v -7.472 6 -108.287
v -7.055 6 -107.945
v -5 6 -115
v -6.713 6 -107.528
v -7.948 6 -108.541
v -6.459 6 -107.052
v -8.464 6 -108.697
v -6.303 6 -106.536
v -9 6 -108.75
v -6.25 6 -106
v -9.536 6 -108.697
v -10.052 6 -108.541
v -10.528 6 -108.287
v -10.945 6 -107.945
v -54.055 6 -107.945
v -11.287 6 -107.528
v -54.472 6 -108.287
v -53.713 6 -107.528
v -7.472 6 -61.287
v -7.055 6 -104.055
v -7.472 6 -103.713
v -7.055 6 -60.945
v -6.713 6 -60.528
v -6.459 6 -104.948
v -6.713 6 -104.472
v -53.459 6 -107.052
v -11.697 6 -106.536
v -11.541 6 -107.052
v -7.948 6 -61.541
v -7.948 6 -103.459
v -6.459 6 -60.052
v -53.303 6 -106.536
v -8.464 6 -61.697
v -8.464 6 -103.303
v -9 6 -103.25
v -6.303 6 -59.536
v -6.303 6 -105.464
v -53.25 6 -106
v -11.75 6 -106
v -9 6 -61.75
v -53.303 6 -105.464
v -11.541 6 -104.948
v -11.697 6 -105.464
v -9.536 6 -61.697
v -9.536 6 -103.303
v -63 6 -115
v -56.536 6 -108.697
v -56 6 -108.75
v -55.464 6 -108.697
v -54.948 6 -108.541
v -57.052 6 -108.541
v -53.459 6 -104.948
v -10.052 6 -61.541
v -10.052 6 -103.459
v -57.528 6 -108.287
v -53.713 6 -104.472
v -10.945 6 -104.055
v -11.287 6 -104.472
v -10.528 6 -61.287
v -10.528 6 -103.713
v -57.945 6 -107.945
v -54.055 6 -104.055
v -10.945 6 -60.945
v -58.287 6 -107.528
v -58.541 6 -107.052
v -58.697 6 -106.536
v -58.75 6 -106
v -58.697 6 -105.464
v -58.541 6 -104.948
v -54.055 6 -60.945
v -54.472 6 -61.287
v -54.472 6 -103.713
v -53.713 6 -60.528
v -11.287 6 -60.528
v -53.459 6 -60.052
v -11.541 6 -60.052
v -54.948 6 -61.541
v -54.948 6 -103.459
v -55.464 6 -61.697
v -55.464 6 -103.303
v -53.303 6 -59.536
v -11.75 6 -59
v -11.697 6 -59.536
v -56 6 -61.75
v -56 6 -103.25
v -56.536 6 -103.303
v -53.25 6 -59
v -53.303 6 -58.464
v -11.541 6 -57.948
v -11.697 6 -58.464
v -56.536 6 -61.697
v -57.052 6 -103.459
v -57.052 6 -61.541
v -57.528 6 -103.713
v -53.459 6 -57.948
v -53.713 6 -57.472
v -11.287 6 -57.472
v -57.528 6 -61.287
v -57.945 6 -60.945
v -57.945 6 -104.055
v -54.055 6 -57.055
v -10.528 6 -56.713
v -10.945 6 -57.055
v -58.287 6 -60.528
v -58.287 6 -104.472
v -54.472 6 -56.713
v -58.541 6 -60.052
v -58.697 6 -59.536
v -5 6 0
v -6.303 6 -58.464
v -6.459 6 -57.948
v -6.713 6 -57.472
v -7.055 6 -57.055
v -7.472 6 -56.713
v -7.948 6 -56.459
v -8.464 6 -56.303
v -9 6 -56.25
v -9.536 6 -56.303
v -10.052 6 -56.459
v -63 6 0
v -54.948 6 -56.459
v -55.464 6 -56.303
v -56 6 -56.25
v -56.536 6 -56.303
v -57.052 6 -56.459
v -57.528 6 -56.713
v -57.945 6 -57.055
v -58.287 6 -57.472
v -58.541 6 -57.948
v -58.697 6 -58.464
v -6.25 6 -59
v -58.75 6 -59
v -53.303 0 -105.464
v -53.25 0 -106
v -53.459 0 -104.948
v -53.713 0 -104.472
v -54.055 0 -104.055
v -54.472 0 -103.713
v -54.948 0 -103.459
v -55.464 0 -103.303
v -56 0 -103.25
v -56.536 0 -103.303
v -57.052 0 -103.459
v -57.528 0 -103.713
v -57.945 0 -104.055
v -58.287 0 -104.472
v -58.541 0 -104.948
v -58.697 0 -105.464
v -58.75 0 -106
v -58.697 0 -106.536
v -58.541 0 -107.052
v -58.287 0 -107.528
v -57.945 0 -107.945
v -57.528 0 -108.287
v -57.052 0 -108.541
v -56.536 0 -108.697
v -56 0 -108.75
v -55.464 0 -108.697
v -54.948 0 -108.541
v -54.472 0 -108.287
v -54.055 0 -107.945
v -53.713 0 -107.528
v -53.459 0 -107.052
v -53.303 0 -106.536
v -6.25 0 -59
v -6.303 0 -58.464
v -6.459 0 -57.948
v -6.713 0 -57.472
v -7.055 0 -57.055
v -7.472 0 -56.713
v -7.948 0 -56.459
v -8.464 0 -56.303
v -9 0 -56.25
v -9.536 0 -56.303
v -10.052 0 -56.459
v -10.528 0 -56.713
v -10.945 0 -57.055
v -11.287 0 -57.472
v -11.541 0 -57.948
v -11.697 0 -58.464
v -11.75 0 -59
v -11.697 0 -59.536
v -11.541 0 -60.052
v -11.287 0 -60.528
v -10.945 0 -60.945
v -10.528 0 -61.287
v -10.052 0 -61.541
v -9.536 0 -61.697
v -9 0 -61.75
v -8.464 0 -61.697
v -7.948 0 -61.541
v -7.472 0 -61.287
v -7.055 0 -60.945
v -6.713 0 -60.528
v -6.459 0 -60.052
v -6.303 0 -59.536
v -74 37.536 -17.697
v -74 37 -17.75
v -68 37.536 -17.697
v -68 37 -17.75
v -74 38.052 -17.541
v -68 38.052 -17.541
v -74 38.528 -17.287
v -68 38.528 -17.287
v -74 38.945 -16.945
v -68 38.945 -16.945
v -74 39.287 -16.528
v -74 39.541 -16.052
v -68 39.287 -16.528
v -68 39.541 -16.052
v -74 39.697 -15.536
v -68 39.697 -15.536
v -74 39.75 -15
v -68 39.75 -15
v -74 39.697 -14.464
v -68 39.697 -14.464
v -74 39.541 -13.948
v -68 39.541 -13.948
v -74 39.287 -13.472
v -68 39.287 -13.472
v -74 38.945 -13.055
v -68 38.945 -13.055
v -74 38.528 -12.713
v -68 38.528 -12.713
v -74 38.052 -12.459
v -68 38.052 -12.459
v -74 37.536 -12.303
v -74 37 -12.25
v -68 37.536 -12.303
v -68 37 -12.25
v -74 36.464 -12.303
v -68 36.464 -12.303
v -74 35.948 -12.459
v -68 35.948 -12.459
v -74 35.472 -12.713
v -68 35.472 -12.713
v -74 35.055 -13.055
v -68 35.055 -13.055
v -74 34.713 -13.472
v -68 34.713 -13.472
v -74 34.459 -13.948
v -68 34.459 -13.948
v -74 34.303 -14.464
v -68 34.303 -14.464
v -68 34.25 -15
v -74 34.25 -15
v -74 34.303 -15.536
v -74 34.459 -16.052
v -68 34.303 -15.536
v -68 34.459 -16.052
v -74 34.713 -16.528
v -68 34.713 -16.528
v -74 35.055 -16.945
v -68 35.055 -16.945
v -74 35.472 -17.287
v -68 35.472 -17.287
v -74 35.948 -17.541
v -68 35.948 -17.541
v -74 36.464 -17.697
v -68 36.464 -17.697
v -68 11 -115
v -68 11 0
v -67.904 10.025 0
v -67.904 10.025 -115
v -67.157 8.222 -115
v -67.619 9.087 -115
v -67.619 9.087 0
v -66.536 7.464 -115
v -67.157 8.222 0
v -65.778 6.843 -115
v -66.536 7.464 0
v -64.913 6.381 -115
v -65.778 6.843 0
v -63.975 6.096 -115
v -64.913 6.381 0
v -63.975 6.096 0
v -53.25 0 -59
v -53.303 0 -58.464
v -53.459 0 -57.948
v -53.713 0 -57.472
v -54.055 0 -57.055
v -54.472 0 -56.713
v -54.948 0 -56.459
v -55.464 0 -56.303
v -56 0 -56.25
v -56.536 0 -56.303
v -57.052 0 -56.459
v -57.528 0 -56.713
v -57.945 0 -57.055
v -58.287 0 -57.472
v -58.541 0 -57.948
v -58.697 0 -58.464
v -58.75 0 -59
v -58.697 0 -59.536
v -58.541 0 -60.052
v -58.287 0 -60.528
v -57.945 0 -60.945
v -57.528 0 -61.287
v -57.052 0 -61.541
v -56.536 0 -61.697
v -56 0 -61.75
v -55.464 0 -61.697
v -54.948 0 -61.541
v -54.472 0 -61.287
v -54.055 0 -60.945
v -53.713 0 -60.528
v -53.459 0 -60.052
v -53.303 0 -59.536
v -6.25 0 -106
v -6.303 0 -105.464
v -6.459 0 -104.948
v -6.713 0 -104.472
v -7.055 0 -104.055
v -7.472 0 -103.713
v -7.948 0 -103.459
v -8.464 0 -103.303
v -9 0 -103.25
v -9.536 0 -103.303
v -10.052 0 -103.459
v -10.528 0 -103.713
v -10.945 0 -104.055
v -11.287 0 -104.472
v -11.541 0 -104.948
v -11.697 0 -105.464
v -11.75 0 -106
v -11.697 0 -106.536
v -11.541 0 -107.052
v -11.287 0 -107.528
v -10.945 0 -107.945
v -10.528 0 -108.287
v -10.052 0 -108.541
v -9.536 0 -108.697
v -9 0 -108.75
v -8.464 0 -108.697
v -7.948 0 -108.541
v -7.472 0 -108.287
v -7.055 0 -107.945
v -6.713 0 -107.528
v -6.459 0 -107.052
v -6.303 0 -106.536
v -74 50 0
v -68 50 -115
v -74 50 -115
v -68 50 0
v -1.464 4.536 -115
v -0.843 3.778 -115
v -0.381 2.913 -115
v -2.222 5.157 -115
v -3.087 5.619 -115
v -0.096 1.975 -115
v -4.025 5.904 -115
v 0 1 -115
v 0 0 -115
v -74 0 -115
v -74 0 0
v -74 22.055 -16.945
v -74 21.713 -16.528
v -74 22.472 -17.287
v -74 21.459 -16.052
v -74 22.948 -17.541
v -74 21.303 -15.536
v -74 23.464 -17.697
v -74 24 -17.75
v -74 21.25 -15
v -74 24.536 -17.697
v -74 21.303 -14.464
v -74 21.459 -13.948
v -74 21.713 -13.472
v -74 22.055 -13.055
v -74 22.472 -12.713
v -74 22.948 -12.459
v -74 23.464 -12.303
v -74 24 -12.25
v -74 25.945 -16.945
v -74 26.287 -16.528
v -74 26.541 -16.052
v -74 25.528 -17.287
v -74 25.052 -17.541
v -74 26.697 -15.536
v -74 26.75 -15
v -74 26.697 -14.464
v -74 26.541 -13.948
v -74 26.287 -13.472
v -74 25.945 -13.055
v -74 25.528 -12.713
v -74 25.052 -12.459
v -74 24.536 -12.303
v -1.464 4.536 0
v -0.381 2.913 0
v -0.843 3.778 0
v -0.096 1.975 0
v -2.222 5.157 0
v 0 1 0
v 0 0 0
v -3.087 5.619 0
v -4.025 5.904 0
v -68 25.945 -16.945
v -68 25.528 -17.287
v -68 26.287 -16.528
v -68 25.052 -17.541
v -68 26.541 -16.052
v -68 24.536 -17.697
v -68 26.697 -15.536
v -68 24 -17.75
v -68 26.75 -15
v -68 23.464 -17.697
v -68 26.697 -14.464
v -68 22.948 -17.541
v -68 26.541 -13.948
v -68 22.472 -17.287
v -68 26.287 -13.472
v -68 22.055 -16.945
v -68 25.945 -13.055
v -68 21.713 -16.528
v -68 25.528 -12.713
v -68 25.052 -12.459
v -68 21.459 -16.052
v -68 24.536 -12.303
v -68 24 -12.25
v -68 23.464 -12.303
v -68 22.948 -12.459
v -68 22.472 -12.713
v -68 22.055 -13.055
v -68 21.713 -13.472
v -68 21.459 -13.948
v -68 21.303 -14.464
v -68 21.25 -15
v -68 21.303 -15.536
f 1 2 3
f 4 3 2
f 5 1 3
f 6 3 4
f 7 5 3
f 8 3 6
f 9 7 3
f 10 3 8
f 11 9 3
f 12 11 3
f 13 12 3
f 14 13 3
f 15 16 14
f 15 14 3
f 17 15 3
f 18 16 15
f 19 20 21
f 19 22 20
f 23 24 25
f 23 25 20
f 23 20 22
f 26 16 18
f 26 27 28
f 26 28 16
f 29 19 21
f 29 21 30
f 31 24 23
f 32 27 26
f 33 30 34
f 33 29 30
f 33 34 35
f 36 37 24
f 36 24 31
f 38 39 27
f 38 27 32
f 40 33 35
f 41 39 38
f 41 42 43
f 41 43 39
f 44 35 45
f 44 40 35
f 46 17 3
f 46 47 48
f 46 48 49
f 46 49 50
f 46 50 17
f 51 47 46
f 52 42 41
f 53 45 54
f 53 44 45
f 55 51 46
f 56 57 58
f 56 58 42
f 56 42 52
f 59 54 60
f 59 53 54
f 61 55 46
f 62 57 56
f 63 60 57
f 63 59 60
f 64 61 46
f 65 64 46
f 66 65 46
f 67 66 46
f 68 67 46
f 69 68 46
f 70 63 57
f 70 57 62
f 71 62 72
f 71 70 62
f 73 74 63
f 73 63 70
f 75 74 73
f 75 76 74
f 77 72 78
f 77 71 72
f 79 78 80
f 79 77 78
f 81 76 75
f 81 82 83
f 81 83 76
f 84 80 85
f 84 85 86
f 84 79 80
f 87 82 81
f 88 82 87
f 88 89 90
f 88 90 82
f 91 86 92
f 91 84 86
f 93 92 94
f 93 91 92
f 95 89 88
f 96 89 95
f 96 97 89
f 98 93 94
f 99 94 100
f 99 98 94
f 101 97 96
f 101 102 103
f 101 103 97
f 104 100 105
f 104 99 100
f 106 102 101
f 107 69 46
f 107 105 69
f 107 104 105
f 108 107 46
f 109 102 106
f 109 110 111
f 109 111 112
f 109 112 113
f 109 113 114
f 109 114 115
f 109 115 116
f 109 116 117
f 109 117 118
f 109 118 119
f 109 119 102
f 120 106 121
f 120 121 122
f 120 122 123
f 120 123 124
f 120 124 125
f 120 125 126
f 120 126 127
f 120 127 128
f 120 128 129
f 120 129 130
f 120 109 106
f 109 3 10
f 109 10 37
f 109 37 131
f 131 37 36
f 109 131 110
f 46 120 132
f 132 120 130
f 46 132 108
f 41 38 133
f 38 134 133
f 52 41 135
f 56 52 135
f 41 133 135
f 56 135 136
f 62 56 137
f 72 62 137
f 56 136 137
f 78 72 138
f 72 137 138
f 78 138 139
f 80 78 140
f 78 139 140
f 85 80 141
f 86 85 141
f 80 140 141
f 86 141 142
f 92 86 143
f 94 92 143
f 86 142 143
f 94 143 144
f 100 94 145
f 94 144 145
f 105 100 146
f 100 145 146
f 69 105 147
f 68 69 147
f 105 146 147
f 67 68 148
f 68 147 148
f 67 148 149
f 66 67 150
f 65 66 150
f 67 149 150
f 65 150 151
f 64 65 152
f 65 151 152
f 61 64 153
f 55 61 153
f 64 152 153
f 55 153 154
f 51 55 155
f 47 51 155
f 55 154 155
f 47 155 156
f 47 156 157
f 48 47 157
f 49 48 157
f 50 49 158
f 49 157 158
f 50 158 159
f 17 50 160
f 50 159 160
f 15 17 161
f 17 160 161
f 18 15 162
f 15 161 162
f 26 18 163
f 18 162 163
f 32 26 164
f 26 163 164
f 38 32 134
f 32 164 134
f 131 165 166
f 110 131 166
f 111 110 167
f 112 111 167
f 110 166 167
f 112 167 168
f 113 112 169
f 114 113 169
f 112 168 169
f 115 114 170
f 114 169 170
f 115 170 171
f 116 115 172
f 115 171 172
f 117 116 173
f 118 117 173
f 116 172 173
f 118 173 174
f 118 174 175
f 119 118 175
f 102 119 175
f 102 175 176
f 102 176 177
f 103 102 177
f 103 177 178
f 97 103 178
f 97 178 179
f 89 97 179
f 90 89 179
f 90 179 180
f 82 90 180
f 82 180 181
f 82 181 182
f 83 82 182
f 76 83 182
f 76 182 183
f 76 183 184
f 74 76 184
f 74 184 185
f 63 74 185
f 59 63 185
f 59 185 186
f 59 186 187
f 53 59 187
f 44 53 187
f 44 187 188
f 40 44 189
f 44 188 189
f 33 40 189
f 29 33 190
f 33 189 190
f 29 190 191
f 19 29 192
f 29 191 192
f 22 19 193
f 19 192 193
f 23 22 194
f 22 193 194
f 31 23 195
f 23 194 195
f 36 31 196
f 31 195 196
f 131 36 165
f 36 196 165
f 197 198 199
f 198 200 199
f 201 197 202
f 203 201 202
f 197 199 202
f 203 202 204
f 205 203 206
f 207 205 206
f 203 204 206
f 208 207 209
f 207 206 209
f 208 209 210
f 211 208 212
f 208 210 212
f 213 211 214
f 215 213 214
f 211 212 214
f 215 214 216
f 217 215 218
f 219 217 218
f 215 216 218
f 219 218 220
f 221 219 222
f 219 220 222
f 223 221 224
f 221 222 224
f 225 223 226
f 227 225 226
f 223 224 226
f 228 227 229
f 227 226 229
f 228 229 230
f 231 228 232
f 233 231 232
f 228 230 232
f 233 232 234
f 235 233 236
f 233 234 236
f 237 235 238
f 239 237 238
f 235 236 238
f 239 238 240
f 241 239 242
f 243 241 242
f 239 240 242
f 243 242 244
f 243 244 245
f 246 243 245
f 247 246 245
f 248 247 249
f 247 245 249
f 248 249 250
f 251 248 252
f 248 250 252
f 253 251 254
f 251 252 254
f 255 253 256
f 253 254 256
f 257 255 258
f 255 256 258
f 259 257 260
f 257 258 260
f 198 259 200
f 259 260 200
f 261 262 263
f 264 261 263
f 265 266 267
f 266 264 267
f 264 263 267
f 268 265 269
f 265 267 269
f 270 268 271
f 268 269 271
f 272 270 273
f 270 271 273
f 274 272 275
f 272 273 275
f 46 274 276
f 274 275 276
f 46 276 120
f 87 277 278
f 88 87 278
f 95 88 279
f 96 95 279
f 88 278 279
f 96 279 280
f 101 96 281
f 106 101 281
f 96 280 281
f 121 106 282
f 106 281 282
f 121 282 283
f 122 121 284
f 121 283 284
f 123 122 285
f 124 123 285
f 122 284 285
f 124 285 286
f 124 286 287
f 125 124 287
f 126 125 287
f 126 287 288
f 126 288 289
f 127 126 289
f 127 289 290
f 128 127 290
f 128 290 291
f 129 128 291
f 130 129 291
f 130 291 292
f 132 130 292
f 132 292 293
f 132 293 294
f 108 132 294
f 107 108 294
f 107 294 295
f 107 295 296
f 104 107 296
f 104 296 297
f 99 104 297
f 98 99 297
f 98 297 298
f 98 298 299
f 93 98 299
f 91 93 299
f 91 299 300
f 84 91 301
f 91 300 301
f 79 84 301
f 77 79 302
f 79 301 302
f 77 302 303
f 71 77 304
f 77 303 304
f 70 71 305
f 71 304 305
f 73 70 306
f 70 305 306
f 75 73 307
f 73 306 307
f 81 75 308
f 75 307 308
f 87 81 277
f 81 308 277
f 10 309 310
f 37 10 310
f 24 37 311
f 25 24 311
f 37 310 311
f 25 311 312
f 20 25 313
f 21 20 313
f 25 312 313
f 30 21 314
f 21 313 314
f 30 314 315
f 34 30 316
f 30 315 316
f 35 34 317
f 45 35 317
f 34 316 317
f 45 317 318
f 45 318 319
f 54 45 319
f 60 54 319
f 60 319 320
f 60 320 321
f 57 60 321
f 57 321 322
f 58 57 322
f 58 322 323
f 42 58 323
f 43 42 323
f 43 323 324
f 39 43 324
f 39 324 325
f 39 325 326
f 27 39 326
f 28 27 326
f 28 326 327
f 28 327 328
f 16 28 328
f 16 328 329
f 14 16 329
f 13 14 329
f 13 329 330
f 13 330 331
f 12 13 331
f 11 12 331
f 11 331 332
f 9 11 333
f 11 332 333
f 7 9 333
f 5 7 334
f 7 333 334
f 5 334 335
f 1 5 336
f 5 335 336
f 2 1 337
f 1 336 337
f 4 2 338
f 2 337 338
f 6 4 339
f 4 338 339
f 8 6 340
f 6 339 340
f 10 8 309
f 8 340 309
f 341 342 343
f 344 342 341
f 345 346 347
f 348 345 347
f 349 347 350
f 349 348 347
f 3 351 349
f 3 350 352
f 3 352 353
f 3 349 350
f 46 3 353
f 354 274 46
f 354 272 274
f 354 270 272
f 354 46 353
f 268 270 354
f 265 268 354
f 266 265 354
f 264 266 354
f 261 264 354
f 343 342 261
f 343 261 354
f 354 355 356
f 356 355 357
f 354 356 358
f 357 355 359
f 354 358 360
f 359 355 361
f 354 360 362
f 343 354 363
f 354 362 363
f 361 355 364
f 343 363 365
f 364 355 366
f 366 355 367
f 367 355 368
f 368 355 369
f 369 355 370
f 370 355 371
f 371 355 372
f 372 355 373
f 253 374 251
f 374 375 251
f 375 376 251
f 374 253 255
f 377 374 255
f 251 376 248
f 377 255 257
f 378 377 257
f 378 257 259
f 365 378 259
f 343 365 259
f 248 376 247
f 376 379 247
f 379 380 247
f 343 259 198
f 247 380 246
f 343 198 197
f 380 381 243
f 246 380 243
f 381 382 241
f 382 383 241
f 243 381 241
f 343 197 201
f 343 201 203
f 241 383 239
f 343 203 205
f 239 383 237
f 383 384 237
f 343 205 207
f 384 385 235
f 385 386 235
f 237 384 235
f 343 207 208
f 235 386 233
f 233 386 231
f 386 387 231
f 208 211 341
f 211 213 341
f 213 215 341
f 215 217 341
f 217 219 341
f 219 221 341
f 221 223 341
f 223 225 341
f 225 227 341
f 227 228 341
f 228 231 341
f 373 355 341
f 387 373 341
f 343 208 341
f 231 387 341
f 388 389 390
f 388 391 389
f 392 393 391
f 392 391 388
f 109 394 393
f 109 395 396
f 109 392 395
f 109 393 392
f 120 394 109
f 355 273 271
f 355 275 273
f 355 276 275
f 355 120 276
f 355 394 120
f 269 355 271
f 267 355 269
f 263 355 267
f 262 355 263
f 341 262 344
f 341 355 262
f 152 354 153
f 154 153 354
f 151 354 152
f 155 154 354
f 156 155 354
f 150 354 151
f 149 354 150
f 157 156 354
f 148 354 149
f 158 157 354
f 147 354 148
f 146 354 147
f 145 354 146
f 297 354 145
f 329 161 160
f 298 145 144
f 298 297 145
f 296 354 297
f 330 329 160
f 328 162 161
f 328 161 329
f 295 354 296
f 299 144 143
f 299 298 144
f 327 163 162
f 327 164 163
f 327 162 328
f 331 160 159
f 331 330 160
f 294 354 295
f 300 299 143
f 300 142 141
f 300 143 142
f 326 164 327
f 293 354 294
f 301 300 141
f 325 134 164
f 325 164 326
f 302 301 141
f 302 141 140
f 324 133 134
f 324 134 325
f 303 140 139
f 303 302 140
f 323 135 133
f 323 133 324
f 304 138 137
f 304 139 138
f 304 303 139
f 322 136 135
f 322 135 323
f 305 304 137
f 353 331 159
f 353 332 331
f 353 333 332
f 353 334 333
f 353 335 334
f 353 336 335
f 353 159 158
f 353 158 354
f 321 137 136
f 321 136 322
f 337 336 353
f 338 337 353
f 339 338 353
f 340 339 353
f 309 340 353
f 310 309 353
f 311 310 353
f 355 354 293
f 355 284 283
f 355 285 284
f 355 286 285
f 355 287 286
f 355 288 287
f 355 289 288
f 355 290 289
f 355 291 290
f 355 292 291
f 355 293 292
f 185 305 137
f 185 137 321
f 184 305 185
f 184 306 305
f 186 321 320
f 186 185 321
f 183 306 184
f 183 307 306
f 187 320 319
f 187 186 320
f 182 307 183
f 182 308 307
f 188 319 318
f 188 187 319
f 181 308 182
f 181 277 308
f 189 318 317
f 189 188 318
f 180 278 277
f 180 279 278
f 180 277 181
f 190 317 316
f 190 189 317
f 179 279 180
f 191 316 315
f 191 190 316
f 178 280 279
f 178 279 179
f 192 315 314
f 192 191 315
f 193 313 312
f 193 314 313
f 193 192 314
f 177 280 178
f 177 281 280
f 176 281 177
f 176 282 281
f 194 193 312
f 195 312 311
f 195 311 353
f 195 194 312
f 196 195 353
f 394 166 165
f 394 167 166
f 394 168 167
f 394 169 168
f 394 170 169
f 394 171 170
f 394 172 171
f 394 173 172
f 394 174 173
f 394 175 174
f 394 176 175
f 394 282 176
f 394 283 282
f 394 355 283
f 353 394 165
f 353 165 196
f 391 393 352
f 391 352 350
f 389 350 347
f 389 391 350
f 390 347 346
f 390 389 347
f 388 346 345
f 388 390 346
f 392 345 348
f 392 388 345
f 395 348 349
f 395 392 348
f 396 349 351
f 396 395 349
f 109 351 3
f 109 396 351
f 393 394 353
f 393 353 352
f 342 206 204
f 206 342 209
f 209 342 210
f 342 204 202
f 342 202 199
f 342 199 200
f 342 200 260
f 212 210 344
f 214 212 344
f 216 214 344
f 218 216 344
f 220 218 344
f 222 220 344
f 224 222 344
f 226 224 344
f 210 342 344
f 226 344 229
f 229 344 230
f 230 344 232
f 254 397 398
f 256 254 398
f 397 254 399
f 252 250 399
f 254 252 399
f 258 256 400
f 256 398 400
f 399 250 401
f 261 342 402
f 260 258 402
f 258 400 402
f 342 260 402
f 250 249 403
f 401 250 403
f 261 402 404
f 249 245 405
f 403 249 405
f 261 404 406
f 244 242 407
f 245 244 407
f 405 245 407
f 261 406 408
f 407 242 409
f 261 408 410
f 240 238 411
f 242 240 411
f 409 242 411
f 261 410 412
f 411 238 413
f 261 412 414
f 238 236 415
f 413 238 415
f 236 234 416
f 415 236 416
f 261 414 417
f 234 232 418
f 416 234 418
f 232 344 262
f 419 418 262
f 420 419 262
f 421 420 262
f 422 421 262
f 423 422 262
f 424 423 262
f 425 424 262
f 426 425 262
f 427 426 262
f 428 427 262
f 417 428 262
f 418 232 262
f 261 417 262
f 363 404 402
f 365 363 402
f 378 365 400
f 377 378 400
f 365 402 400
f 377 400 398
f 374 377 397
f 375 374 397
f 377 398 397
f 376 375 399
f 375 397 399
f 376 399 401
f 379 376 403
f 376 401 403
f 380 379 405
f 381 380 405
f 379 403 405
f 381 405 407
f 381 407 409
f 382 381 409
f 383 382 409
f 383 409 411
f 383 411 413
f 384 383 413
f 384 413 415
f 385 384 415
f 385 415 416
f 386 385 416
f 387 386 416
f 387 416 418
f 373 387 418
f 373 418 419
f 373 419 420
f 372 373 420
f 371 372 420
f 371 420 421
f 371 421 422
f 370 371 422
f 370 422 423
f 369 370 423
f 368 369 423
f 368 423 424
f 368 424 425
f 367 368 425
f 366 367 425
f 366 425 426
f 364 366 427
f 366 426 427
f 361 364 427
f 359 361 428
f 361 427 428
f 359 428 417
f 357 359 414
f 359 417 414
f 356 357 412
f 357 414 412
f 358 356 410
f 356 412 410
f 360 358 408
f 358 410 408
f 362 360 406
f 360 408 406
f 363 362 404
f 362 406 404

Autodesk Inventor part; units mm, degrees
ref_plane "YZ Plane" through (0, 0, 0) normal (1, 0, 0) x (0, 1, 0)
ref_plane "XZ Plane" through (0, 0, 0) normal (0, 1, 0) x (-1, 0, 0)
sketch "Sketch1" plane through (0, 0, 0) normal (0, 1, 0) x (-1, 0, 0)
  line L0 (0, 0) -> (74, 0)
  line L1 (74, 0) -> (74, -30)
  line L2 (74, -30) -> (0, -30)
  line L3 (0, -30) -> (0, 0)
  dimension "d0" = 74
  dimension "d1" = 30
extrude "Extrusion1" add sketch "Sketch1" along normal blind 6
fillet "Fillet1" radius 5 1 edges at (-74, 0, -15)
fillet "Fillet2" radius 5 1 edges at (0, 6, -15)
ref_plane "Work Plane1" through (-74, 0, 0) normal (0.7071, -0.7071, 0) x (0, 0, 1)
mirror "Mirror1" about plane through (-74, 0, 0) normal (0.7071, -0.7071, 0) of "Extrusion1", "Fillet2"
fillet "Fillet3" radius 5 1 edges at (-68, 6, -15)
sketch "Sketch5" plane through (0, 0, -30) normal (0, 0, -1) x (-1, 0, 0)
  line L0 (5, 6) -> (63, 6) projected
  arc A0 (5, 6) -> (0, 1) centre (5, 1) ccw projected
  line L1 (0, 0) -> (0, 1) projected
  line L2 (74, 0) -> (0, 0) projected
  line L3 (74, 0) -> (74, 74) projected
  line L4 (74, 74) -> (73, 74) projected
  arc A1 (73, 74) -> (68, 69) centre (73, 69) ccw projected
  line L5 (68, 69) -> (68, 11) projected
  arc A2 (63, 6) -> (68, 11) centre (63, 11) ccw projected
  point P0 (0, 0)
extrude "Extrusion6" add sketch "Sketch5" along normal blind 85
sketch "Sketch7" plane through (-68, 11, 0) normal (1, 0, 0) x (0, 0, -1)
  line L0 (115, 58) -> (115, 0) projected
  line L1 (115, 58) -> (115, 63) projected
  line L2 (115, -11) -> (115, 63) projected
  line L3 (0, 63) -> (115, 63) projected
  line L4 (0, 63) -> (115, 63)
  line L5 (115, 63) -> (115, 39)
  line L6 (115, 39) -> (0, 39)
  line L7 (0, 39) -> (0, 63)
  point P0 (0, -11)
  dimension "d49" = 74
  dimension "d50" = 24
extrude "Extrusion7" cut sketch "Sketch7" against normal blind 10
sketch "Sketch8" plane through (-68, 11, 0) normal (1, 0, 0) x (0, 0, -1)
  circle A0 centre (15, 13) radius 2.75
  line L0 (0, 0) -> (0, 39) projected
  line L1 (115, 0) -> (0, 0) projected
  circle A1 centre (15, 26) radius 2.75
  point P0 (0, -11)
  dimension "d53" = 5.5
  dimension "d54" = 15
  dimension "d55" = 39
  dimension "d56" = 13
  dimension "d57" = 5.5
  dimension "d58" = 15
  dimension "d59" = 26
extrude "Extrusion8" cut sketch "Sketch8" against normal blind 10
sketch "Sketch9" plane through (0, 0, 0) normal (0, -1, 0) x (1, 0, 0)
  line L0 (0, -115) -> (0, 0) projected
  line L1 (0, 0) -> (-74, 0) projected
  line L2 (-74, 0) -> (-74, -115) projected
  line L3 (0, -115) -> (-74, -115) projected
  circle A0 centre (-9, -106) radius 2.75
  circle A1 centre (-56, -106) radius 2.75
  circle A2 centre (-9, -59) radius 2.75
  circle A3 centre (-56, -59) radius 2.75
  dimension "d62" = 5.5
  dimension "d65" = 47
  dimension "d68" = 47
  dimension "d71" = 9
  dimension "d72" = 9
extrude "Extrusion9" cut sketch "Sketch9" against normal blind 10 contours A0 | A1 | A2 | A3
equation "\"d56\" = 0.333333 * d55"
equation "\"d58\" = d54"
equation "\"d59\" = 2 * d56"
equation "\"d72\" = d71"
properties part number "L_Fixer" material "Steel, Carbon"
